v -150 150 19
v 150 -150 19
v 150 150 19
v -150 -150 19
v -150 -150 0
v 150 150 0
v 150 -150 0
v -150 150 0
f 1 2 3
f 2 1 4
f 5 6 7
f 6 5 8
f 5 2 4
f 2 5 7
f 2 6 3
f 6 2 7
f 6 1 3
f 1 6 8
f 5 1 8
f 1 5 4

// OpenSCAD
/*
    Insert
*/

module insert(thicknessMaterial){
width = 300;
depth = 300;

translate([
    -width/2,
    -depth/2,
    0])
cube([
    width,
    depth,
    thicknessMaterial]);
}


insert(19);
